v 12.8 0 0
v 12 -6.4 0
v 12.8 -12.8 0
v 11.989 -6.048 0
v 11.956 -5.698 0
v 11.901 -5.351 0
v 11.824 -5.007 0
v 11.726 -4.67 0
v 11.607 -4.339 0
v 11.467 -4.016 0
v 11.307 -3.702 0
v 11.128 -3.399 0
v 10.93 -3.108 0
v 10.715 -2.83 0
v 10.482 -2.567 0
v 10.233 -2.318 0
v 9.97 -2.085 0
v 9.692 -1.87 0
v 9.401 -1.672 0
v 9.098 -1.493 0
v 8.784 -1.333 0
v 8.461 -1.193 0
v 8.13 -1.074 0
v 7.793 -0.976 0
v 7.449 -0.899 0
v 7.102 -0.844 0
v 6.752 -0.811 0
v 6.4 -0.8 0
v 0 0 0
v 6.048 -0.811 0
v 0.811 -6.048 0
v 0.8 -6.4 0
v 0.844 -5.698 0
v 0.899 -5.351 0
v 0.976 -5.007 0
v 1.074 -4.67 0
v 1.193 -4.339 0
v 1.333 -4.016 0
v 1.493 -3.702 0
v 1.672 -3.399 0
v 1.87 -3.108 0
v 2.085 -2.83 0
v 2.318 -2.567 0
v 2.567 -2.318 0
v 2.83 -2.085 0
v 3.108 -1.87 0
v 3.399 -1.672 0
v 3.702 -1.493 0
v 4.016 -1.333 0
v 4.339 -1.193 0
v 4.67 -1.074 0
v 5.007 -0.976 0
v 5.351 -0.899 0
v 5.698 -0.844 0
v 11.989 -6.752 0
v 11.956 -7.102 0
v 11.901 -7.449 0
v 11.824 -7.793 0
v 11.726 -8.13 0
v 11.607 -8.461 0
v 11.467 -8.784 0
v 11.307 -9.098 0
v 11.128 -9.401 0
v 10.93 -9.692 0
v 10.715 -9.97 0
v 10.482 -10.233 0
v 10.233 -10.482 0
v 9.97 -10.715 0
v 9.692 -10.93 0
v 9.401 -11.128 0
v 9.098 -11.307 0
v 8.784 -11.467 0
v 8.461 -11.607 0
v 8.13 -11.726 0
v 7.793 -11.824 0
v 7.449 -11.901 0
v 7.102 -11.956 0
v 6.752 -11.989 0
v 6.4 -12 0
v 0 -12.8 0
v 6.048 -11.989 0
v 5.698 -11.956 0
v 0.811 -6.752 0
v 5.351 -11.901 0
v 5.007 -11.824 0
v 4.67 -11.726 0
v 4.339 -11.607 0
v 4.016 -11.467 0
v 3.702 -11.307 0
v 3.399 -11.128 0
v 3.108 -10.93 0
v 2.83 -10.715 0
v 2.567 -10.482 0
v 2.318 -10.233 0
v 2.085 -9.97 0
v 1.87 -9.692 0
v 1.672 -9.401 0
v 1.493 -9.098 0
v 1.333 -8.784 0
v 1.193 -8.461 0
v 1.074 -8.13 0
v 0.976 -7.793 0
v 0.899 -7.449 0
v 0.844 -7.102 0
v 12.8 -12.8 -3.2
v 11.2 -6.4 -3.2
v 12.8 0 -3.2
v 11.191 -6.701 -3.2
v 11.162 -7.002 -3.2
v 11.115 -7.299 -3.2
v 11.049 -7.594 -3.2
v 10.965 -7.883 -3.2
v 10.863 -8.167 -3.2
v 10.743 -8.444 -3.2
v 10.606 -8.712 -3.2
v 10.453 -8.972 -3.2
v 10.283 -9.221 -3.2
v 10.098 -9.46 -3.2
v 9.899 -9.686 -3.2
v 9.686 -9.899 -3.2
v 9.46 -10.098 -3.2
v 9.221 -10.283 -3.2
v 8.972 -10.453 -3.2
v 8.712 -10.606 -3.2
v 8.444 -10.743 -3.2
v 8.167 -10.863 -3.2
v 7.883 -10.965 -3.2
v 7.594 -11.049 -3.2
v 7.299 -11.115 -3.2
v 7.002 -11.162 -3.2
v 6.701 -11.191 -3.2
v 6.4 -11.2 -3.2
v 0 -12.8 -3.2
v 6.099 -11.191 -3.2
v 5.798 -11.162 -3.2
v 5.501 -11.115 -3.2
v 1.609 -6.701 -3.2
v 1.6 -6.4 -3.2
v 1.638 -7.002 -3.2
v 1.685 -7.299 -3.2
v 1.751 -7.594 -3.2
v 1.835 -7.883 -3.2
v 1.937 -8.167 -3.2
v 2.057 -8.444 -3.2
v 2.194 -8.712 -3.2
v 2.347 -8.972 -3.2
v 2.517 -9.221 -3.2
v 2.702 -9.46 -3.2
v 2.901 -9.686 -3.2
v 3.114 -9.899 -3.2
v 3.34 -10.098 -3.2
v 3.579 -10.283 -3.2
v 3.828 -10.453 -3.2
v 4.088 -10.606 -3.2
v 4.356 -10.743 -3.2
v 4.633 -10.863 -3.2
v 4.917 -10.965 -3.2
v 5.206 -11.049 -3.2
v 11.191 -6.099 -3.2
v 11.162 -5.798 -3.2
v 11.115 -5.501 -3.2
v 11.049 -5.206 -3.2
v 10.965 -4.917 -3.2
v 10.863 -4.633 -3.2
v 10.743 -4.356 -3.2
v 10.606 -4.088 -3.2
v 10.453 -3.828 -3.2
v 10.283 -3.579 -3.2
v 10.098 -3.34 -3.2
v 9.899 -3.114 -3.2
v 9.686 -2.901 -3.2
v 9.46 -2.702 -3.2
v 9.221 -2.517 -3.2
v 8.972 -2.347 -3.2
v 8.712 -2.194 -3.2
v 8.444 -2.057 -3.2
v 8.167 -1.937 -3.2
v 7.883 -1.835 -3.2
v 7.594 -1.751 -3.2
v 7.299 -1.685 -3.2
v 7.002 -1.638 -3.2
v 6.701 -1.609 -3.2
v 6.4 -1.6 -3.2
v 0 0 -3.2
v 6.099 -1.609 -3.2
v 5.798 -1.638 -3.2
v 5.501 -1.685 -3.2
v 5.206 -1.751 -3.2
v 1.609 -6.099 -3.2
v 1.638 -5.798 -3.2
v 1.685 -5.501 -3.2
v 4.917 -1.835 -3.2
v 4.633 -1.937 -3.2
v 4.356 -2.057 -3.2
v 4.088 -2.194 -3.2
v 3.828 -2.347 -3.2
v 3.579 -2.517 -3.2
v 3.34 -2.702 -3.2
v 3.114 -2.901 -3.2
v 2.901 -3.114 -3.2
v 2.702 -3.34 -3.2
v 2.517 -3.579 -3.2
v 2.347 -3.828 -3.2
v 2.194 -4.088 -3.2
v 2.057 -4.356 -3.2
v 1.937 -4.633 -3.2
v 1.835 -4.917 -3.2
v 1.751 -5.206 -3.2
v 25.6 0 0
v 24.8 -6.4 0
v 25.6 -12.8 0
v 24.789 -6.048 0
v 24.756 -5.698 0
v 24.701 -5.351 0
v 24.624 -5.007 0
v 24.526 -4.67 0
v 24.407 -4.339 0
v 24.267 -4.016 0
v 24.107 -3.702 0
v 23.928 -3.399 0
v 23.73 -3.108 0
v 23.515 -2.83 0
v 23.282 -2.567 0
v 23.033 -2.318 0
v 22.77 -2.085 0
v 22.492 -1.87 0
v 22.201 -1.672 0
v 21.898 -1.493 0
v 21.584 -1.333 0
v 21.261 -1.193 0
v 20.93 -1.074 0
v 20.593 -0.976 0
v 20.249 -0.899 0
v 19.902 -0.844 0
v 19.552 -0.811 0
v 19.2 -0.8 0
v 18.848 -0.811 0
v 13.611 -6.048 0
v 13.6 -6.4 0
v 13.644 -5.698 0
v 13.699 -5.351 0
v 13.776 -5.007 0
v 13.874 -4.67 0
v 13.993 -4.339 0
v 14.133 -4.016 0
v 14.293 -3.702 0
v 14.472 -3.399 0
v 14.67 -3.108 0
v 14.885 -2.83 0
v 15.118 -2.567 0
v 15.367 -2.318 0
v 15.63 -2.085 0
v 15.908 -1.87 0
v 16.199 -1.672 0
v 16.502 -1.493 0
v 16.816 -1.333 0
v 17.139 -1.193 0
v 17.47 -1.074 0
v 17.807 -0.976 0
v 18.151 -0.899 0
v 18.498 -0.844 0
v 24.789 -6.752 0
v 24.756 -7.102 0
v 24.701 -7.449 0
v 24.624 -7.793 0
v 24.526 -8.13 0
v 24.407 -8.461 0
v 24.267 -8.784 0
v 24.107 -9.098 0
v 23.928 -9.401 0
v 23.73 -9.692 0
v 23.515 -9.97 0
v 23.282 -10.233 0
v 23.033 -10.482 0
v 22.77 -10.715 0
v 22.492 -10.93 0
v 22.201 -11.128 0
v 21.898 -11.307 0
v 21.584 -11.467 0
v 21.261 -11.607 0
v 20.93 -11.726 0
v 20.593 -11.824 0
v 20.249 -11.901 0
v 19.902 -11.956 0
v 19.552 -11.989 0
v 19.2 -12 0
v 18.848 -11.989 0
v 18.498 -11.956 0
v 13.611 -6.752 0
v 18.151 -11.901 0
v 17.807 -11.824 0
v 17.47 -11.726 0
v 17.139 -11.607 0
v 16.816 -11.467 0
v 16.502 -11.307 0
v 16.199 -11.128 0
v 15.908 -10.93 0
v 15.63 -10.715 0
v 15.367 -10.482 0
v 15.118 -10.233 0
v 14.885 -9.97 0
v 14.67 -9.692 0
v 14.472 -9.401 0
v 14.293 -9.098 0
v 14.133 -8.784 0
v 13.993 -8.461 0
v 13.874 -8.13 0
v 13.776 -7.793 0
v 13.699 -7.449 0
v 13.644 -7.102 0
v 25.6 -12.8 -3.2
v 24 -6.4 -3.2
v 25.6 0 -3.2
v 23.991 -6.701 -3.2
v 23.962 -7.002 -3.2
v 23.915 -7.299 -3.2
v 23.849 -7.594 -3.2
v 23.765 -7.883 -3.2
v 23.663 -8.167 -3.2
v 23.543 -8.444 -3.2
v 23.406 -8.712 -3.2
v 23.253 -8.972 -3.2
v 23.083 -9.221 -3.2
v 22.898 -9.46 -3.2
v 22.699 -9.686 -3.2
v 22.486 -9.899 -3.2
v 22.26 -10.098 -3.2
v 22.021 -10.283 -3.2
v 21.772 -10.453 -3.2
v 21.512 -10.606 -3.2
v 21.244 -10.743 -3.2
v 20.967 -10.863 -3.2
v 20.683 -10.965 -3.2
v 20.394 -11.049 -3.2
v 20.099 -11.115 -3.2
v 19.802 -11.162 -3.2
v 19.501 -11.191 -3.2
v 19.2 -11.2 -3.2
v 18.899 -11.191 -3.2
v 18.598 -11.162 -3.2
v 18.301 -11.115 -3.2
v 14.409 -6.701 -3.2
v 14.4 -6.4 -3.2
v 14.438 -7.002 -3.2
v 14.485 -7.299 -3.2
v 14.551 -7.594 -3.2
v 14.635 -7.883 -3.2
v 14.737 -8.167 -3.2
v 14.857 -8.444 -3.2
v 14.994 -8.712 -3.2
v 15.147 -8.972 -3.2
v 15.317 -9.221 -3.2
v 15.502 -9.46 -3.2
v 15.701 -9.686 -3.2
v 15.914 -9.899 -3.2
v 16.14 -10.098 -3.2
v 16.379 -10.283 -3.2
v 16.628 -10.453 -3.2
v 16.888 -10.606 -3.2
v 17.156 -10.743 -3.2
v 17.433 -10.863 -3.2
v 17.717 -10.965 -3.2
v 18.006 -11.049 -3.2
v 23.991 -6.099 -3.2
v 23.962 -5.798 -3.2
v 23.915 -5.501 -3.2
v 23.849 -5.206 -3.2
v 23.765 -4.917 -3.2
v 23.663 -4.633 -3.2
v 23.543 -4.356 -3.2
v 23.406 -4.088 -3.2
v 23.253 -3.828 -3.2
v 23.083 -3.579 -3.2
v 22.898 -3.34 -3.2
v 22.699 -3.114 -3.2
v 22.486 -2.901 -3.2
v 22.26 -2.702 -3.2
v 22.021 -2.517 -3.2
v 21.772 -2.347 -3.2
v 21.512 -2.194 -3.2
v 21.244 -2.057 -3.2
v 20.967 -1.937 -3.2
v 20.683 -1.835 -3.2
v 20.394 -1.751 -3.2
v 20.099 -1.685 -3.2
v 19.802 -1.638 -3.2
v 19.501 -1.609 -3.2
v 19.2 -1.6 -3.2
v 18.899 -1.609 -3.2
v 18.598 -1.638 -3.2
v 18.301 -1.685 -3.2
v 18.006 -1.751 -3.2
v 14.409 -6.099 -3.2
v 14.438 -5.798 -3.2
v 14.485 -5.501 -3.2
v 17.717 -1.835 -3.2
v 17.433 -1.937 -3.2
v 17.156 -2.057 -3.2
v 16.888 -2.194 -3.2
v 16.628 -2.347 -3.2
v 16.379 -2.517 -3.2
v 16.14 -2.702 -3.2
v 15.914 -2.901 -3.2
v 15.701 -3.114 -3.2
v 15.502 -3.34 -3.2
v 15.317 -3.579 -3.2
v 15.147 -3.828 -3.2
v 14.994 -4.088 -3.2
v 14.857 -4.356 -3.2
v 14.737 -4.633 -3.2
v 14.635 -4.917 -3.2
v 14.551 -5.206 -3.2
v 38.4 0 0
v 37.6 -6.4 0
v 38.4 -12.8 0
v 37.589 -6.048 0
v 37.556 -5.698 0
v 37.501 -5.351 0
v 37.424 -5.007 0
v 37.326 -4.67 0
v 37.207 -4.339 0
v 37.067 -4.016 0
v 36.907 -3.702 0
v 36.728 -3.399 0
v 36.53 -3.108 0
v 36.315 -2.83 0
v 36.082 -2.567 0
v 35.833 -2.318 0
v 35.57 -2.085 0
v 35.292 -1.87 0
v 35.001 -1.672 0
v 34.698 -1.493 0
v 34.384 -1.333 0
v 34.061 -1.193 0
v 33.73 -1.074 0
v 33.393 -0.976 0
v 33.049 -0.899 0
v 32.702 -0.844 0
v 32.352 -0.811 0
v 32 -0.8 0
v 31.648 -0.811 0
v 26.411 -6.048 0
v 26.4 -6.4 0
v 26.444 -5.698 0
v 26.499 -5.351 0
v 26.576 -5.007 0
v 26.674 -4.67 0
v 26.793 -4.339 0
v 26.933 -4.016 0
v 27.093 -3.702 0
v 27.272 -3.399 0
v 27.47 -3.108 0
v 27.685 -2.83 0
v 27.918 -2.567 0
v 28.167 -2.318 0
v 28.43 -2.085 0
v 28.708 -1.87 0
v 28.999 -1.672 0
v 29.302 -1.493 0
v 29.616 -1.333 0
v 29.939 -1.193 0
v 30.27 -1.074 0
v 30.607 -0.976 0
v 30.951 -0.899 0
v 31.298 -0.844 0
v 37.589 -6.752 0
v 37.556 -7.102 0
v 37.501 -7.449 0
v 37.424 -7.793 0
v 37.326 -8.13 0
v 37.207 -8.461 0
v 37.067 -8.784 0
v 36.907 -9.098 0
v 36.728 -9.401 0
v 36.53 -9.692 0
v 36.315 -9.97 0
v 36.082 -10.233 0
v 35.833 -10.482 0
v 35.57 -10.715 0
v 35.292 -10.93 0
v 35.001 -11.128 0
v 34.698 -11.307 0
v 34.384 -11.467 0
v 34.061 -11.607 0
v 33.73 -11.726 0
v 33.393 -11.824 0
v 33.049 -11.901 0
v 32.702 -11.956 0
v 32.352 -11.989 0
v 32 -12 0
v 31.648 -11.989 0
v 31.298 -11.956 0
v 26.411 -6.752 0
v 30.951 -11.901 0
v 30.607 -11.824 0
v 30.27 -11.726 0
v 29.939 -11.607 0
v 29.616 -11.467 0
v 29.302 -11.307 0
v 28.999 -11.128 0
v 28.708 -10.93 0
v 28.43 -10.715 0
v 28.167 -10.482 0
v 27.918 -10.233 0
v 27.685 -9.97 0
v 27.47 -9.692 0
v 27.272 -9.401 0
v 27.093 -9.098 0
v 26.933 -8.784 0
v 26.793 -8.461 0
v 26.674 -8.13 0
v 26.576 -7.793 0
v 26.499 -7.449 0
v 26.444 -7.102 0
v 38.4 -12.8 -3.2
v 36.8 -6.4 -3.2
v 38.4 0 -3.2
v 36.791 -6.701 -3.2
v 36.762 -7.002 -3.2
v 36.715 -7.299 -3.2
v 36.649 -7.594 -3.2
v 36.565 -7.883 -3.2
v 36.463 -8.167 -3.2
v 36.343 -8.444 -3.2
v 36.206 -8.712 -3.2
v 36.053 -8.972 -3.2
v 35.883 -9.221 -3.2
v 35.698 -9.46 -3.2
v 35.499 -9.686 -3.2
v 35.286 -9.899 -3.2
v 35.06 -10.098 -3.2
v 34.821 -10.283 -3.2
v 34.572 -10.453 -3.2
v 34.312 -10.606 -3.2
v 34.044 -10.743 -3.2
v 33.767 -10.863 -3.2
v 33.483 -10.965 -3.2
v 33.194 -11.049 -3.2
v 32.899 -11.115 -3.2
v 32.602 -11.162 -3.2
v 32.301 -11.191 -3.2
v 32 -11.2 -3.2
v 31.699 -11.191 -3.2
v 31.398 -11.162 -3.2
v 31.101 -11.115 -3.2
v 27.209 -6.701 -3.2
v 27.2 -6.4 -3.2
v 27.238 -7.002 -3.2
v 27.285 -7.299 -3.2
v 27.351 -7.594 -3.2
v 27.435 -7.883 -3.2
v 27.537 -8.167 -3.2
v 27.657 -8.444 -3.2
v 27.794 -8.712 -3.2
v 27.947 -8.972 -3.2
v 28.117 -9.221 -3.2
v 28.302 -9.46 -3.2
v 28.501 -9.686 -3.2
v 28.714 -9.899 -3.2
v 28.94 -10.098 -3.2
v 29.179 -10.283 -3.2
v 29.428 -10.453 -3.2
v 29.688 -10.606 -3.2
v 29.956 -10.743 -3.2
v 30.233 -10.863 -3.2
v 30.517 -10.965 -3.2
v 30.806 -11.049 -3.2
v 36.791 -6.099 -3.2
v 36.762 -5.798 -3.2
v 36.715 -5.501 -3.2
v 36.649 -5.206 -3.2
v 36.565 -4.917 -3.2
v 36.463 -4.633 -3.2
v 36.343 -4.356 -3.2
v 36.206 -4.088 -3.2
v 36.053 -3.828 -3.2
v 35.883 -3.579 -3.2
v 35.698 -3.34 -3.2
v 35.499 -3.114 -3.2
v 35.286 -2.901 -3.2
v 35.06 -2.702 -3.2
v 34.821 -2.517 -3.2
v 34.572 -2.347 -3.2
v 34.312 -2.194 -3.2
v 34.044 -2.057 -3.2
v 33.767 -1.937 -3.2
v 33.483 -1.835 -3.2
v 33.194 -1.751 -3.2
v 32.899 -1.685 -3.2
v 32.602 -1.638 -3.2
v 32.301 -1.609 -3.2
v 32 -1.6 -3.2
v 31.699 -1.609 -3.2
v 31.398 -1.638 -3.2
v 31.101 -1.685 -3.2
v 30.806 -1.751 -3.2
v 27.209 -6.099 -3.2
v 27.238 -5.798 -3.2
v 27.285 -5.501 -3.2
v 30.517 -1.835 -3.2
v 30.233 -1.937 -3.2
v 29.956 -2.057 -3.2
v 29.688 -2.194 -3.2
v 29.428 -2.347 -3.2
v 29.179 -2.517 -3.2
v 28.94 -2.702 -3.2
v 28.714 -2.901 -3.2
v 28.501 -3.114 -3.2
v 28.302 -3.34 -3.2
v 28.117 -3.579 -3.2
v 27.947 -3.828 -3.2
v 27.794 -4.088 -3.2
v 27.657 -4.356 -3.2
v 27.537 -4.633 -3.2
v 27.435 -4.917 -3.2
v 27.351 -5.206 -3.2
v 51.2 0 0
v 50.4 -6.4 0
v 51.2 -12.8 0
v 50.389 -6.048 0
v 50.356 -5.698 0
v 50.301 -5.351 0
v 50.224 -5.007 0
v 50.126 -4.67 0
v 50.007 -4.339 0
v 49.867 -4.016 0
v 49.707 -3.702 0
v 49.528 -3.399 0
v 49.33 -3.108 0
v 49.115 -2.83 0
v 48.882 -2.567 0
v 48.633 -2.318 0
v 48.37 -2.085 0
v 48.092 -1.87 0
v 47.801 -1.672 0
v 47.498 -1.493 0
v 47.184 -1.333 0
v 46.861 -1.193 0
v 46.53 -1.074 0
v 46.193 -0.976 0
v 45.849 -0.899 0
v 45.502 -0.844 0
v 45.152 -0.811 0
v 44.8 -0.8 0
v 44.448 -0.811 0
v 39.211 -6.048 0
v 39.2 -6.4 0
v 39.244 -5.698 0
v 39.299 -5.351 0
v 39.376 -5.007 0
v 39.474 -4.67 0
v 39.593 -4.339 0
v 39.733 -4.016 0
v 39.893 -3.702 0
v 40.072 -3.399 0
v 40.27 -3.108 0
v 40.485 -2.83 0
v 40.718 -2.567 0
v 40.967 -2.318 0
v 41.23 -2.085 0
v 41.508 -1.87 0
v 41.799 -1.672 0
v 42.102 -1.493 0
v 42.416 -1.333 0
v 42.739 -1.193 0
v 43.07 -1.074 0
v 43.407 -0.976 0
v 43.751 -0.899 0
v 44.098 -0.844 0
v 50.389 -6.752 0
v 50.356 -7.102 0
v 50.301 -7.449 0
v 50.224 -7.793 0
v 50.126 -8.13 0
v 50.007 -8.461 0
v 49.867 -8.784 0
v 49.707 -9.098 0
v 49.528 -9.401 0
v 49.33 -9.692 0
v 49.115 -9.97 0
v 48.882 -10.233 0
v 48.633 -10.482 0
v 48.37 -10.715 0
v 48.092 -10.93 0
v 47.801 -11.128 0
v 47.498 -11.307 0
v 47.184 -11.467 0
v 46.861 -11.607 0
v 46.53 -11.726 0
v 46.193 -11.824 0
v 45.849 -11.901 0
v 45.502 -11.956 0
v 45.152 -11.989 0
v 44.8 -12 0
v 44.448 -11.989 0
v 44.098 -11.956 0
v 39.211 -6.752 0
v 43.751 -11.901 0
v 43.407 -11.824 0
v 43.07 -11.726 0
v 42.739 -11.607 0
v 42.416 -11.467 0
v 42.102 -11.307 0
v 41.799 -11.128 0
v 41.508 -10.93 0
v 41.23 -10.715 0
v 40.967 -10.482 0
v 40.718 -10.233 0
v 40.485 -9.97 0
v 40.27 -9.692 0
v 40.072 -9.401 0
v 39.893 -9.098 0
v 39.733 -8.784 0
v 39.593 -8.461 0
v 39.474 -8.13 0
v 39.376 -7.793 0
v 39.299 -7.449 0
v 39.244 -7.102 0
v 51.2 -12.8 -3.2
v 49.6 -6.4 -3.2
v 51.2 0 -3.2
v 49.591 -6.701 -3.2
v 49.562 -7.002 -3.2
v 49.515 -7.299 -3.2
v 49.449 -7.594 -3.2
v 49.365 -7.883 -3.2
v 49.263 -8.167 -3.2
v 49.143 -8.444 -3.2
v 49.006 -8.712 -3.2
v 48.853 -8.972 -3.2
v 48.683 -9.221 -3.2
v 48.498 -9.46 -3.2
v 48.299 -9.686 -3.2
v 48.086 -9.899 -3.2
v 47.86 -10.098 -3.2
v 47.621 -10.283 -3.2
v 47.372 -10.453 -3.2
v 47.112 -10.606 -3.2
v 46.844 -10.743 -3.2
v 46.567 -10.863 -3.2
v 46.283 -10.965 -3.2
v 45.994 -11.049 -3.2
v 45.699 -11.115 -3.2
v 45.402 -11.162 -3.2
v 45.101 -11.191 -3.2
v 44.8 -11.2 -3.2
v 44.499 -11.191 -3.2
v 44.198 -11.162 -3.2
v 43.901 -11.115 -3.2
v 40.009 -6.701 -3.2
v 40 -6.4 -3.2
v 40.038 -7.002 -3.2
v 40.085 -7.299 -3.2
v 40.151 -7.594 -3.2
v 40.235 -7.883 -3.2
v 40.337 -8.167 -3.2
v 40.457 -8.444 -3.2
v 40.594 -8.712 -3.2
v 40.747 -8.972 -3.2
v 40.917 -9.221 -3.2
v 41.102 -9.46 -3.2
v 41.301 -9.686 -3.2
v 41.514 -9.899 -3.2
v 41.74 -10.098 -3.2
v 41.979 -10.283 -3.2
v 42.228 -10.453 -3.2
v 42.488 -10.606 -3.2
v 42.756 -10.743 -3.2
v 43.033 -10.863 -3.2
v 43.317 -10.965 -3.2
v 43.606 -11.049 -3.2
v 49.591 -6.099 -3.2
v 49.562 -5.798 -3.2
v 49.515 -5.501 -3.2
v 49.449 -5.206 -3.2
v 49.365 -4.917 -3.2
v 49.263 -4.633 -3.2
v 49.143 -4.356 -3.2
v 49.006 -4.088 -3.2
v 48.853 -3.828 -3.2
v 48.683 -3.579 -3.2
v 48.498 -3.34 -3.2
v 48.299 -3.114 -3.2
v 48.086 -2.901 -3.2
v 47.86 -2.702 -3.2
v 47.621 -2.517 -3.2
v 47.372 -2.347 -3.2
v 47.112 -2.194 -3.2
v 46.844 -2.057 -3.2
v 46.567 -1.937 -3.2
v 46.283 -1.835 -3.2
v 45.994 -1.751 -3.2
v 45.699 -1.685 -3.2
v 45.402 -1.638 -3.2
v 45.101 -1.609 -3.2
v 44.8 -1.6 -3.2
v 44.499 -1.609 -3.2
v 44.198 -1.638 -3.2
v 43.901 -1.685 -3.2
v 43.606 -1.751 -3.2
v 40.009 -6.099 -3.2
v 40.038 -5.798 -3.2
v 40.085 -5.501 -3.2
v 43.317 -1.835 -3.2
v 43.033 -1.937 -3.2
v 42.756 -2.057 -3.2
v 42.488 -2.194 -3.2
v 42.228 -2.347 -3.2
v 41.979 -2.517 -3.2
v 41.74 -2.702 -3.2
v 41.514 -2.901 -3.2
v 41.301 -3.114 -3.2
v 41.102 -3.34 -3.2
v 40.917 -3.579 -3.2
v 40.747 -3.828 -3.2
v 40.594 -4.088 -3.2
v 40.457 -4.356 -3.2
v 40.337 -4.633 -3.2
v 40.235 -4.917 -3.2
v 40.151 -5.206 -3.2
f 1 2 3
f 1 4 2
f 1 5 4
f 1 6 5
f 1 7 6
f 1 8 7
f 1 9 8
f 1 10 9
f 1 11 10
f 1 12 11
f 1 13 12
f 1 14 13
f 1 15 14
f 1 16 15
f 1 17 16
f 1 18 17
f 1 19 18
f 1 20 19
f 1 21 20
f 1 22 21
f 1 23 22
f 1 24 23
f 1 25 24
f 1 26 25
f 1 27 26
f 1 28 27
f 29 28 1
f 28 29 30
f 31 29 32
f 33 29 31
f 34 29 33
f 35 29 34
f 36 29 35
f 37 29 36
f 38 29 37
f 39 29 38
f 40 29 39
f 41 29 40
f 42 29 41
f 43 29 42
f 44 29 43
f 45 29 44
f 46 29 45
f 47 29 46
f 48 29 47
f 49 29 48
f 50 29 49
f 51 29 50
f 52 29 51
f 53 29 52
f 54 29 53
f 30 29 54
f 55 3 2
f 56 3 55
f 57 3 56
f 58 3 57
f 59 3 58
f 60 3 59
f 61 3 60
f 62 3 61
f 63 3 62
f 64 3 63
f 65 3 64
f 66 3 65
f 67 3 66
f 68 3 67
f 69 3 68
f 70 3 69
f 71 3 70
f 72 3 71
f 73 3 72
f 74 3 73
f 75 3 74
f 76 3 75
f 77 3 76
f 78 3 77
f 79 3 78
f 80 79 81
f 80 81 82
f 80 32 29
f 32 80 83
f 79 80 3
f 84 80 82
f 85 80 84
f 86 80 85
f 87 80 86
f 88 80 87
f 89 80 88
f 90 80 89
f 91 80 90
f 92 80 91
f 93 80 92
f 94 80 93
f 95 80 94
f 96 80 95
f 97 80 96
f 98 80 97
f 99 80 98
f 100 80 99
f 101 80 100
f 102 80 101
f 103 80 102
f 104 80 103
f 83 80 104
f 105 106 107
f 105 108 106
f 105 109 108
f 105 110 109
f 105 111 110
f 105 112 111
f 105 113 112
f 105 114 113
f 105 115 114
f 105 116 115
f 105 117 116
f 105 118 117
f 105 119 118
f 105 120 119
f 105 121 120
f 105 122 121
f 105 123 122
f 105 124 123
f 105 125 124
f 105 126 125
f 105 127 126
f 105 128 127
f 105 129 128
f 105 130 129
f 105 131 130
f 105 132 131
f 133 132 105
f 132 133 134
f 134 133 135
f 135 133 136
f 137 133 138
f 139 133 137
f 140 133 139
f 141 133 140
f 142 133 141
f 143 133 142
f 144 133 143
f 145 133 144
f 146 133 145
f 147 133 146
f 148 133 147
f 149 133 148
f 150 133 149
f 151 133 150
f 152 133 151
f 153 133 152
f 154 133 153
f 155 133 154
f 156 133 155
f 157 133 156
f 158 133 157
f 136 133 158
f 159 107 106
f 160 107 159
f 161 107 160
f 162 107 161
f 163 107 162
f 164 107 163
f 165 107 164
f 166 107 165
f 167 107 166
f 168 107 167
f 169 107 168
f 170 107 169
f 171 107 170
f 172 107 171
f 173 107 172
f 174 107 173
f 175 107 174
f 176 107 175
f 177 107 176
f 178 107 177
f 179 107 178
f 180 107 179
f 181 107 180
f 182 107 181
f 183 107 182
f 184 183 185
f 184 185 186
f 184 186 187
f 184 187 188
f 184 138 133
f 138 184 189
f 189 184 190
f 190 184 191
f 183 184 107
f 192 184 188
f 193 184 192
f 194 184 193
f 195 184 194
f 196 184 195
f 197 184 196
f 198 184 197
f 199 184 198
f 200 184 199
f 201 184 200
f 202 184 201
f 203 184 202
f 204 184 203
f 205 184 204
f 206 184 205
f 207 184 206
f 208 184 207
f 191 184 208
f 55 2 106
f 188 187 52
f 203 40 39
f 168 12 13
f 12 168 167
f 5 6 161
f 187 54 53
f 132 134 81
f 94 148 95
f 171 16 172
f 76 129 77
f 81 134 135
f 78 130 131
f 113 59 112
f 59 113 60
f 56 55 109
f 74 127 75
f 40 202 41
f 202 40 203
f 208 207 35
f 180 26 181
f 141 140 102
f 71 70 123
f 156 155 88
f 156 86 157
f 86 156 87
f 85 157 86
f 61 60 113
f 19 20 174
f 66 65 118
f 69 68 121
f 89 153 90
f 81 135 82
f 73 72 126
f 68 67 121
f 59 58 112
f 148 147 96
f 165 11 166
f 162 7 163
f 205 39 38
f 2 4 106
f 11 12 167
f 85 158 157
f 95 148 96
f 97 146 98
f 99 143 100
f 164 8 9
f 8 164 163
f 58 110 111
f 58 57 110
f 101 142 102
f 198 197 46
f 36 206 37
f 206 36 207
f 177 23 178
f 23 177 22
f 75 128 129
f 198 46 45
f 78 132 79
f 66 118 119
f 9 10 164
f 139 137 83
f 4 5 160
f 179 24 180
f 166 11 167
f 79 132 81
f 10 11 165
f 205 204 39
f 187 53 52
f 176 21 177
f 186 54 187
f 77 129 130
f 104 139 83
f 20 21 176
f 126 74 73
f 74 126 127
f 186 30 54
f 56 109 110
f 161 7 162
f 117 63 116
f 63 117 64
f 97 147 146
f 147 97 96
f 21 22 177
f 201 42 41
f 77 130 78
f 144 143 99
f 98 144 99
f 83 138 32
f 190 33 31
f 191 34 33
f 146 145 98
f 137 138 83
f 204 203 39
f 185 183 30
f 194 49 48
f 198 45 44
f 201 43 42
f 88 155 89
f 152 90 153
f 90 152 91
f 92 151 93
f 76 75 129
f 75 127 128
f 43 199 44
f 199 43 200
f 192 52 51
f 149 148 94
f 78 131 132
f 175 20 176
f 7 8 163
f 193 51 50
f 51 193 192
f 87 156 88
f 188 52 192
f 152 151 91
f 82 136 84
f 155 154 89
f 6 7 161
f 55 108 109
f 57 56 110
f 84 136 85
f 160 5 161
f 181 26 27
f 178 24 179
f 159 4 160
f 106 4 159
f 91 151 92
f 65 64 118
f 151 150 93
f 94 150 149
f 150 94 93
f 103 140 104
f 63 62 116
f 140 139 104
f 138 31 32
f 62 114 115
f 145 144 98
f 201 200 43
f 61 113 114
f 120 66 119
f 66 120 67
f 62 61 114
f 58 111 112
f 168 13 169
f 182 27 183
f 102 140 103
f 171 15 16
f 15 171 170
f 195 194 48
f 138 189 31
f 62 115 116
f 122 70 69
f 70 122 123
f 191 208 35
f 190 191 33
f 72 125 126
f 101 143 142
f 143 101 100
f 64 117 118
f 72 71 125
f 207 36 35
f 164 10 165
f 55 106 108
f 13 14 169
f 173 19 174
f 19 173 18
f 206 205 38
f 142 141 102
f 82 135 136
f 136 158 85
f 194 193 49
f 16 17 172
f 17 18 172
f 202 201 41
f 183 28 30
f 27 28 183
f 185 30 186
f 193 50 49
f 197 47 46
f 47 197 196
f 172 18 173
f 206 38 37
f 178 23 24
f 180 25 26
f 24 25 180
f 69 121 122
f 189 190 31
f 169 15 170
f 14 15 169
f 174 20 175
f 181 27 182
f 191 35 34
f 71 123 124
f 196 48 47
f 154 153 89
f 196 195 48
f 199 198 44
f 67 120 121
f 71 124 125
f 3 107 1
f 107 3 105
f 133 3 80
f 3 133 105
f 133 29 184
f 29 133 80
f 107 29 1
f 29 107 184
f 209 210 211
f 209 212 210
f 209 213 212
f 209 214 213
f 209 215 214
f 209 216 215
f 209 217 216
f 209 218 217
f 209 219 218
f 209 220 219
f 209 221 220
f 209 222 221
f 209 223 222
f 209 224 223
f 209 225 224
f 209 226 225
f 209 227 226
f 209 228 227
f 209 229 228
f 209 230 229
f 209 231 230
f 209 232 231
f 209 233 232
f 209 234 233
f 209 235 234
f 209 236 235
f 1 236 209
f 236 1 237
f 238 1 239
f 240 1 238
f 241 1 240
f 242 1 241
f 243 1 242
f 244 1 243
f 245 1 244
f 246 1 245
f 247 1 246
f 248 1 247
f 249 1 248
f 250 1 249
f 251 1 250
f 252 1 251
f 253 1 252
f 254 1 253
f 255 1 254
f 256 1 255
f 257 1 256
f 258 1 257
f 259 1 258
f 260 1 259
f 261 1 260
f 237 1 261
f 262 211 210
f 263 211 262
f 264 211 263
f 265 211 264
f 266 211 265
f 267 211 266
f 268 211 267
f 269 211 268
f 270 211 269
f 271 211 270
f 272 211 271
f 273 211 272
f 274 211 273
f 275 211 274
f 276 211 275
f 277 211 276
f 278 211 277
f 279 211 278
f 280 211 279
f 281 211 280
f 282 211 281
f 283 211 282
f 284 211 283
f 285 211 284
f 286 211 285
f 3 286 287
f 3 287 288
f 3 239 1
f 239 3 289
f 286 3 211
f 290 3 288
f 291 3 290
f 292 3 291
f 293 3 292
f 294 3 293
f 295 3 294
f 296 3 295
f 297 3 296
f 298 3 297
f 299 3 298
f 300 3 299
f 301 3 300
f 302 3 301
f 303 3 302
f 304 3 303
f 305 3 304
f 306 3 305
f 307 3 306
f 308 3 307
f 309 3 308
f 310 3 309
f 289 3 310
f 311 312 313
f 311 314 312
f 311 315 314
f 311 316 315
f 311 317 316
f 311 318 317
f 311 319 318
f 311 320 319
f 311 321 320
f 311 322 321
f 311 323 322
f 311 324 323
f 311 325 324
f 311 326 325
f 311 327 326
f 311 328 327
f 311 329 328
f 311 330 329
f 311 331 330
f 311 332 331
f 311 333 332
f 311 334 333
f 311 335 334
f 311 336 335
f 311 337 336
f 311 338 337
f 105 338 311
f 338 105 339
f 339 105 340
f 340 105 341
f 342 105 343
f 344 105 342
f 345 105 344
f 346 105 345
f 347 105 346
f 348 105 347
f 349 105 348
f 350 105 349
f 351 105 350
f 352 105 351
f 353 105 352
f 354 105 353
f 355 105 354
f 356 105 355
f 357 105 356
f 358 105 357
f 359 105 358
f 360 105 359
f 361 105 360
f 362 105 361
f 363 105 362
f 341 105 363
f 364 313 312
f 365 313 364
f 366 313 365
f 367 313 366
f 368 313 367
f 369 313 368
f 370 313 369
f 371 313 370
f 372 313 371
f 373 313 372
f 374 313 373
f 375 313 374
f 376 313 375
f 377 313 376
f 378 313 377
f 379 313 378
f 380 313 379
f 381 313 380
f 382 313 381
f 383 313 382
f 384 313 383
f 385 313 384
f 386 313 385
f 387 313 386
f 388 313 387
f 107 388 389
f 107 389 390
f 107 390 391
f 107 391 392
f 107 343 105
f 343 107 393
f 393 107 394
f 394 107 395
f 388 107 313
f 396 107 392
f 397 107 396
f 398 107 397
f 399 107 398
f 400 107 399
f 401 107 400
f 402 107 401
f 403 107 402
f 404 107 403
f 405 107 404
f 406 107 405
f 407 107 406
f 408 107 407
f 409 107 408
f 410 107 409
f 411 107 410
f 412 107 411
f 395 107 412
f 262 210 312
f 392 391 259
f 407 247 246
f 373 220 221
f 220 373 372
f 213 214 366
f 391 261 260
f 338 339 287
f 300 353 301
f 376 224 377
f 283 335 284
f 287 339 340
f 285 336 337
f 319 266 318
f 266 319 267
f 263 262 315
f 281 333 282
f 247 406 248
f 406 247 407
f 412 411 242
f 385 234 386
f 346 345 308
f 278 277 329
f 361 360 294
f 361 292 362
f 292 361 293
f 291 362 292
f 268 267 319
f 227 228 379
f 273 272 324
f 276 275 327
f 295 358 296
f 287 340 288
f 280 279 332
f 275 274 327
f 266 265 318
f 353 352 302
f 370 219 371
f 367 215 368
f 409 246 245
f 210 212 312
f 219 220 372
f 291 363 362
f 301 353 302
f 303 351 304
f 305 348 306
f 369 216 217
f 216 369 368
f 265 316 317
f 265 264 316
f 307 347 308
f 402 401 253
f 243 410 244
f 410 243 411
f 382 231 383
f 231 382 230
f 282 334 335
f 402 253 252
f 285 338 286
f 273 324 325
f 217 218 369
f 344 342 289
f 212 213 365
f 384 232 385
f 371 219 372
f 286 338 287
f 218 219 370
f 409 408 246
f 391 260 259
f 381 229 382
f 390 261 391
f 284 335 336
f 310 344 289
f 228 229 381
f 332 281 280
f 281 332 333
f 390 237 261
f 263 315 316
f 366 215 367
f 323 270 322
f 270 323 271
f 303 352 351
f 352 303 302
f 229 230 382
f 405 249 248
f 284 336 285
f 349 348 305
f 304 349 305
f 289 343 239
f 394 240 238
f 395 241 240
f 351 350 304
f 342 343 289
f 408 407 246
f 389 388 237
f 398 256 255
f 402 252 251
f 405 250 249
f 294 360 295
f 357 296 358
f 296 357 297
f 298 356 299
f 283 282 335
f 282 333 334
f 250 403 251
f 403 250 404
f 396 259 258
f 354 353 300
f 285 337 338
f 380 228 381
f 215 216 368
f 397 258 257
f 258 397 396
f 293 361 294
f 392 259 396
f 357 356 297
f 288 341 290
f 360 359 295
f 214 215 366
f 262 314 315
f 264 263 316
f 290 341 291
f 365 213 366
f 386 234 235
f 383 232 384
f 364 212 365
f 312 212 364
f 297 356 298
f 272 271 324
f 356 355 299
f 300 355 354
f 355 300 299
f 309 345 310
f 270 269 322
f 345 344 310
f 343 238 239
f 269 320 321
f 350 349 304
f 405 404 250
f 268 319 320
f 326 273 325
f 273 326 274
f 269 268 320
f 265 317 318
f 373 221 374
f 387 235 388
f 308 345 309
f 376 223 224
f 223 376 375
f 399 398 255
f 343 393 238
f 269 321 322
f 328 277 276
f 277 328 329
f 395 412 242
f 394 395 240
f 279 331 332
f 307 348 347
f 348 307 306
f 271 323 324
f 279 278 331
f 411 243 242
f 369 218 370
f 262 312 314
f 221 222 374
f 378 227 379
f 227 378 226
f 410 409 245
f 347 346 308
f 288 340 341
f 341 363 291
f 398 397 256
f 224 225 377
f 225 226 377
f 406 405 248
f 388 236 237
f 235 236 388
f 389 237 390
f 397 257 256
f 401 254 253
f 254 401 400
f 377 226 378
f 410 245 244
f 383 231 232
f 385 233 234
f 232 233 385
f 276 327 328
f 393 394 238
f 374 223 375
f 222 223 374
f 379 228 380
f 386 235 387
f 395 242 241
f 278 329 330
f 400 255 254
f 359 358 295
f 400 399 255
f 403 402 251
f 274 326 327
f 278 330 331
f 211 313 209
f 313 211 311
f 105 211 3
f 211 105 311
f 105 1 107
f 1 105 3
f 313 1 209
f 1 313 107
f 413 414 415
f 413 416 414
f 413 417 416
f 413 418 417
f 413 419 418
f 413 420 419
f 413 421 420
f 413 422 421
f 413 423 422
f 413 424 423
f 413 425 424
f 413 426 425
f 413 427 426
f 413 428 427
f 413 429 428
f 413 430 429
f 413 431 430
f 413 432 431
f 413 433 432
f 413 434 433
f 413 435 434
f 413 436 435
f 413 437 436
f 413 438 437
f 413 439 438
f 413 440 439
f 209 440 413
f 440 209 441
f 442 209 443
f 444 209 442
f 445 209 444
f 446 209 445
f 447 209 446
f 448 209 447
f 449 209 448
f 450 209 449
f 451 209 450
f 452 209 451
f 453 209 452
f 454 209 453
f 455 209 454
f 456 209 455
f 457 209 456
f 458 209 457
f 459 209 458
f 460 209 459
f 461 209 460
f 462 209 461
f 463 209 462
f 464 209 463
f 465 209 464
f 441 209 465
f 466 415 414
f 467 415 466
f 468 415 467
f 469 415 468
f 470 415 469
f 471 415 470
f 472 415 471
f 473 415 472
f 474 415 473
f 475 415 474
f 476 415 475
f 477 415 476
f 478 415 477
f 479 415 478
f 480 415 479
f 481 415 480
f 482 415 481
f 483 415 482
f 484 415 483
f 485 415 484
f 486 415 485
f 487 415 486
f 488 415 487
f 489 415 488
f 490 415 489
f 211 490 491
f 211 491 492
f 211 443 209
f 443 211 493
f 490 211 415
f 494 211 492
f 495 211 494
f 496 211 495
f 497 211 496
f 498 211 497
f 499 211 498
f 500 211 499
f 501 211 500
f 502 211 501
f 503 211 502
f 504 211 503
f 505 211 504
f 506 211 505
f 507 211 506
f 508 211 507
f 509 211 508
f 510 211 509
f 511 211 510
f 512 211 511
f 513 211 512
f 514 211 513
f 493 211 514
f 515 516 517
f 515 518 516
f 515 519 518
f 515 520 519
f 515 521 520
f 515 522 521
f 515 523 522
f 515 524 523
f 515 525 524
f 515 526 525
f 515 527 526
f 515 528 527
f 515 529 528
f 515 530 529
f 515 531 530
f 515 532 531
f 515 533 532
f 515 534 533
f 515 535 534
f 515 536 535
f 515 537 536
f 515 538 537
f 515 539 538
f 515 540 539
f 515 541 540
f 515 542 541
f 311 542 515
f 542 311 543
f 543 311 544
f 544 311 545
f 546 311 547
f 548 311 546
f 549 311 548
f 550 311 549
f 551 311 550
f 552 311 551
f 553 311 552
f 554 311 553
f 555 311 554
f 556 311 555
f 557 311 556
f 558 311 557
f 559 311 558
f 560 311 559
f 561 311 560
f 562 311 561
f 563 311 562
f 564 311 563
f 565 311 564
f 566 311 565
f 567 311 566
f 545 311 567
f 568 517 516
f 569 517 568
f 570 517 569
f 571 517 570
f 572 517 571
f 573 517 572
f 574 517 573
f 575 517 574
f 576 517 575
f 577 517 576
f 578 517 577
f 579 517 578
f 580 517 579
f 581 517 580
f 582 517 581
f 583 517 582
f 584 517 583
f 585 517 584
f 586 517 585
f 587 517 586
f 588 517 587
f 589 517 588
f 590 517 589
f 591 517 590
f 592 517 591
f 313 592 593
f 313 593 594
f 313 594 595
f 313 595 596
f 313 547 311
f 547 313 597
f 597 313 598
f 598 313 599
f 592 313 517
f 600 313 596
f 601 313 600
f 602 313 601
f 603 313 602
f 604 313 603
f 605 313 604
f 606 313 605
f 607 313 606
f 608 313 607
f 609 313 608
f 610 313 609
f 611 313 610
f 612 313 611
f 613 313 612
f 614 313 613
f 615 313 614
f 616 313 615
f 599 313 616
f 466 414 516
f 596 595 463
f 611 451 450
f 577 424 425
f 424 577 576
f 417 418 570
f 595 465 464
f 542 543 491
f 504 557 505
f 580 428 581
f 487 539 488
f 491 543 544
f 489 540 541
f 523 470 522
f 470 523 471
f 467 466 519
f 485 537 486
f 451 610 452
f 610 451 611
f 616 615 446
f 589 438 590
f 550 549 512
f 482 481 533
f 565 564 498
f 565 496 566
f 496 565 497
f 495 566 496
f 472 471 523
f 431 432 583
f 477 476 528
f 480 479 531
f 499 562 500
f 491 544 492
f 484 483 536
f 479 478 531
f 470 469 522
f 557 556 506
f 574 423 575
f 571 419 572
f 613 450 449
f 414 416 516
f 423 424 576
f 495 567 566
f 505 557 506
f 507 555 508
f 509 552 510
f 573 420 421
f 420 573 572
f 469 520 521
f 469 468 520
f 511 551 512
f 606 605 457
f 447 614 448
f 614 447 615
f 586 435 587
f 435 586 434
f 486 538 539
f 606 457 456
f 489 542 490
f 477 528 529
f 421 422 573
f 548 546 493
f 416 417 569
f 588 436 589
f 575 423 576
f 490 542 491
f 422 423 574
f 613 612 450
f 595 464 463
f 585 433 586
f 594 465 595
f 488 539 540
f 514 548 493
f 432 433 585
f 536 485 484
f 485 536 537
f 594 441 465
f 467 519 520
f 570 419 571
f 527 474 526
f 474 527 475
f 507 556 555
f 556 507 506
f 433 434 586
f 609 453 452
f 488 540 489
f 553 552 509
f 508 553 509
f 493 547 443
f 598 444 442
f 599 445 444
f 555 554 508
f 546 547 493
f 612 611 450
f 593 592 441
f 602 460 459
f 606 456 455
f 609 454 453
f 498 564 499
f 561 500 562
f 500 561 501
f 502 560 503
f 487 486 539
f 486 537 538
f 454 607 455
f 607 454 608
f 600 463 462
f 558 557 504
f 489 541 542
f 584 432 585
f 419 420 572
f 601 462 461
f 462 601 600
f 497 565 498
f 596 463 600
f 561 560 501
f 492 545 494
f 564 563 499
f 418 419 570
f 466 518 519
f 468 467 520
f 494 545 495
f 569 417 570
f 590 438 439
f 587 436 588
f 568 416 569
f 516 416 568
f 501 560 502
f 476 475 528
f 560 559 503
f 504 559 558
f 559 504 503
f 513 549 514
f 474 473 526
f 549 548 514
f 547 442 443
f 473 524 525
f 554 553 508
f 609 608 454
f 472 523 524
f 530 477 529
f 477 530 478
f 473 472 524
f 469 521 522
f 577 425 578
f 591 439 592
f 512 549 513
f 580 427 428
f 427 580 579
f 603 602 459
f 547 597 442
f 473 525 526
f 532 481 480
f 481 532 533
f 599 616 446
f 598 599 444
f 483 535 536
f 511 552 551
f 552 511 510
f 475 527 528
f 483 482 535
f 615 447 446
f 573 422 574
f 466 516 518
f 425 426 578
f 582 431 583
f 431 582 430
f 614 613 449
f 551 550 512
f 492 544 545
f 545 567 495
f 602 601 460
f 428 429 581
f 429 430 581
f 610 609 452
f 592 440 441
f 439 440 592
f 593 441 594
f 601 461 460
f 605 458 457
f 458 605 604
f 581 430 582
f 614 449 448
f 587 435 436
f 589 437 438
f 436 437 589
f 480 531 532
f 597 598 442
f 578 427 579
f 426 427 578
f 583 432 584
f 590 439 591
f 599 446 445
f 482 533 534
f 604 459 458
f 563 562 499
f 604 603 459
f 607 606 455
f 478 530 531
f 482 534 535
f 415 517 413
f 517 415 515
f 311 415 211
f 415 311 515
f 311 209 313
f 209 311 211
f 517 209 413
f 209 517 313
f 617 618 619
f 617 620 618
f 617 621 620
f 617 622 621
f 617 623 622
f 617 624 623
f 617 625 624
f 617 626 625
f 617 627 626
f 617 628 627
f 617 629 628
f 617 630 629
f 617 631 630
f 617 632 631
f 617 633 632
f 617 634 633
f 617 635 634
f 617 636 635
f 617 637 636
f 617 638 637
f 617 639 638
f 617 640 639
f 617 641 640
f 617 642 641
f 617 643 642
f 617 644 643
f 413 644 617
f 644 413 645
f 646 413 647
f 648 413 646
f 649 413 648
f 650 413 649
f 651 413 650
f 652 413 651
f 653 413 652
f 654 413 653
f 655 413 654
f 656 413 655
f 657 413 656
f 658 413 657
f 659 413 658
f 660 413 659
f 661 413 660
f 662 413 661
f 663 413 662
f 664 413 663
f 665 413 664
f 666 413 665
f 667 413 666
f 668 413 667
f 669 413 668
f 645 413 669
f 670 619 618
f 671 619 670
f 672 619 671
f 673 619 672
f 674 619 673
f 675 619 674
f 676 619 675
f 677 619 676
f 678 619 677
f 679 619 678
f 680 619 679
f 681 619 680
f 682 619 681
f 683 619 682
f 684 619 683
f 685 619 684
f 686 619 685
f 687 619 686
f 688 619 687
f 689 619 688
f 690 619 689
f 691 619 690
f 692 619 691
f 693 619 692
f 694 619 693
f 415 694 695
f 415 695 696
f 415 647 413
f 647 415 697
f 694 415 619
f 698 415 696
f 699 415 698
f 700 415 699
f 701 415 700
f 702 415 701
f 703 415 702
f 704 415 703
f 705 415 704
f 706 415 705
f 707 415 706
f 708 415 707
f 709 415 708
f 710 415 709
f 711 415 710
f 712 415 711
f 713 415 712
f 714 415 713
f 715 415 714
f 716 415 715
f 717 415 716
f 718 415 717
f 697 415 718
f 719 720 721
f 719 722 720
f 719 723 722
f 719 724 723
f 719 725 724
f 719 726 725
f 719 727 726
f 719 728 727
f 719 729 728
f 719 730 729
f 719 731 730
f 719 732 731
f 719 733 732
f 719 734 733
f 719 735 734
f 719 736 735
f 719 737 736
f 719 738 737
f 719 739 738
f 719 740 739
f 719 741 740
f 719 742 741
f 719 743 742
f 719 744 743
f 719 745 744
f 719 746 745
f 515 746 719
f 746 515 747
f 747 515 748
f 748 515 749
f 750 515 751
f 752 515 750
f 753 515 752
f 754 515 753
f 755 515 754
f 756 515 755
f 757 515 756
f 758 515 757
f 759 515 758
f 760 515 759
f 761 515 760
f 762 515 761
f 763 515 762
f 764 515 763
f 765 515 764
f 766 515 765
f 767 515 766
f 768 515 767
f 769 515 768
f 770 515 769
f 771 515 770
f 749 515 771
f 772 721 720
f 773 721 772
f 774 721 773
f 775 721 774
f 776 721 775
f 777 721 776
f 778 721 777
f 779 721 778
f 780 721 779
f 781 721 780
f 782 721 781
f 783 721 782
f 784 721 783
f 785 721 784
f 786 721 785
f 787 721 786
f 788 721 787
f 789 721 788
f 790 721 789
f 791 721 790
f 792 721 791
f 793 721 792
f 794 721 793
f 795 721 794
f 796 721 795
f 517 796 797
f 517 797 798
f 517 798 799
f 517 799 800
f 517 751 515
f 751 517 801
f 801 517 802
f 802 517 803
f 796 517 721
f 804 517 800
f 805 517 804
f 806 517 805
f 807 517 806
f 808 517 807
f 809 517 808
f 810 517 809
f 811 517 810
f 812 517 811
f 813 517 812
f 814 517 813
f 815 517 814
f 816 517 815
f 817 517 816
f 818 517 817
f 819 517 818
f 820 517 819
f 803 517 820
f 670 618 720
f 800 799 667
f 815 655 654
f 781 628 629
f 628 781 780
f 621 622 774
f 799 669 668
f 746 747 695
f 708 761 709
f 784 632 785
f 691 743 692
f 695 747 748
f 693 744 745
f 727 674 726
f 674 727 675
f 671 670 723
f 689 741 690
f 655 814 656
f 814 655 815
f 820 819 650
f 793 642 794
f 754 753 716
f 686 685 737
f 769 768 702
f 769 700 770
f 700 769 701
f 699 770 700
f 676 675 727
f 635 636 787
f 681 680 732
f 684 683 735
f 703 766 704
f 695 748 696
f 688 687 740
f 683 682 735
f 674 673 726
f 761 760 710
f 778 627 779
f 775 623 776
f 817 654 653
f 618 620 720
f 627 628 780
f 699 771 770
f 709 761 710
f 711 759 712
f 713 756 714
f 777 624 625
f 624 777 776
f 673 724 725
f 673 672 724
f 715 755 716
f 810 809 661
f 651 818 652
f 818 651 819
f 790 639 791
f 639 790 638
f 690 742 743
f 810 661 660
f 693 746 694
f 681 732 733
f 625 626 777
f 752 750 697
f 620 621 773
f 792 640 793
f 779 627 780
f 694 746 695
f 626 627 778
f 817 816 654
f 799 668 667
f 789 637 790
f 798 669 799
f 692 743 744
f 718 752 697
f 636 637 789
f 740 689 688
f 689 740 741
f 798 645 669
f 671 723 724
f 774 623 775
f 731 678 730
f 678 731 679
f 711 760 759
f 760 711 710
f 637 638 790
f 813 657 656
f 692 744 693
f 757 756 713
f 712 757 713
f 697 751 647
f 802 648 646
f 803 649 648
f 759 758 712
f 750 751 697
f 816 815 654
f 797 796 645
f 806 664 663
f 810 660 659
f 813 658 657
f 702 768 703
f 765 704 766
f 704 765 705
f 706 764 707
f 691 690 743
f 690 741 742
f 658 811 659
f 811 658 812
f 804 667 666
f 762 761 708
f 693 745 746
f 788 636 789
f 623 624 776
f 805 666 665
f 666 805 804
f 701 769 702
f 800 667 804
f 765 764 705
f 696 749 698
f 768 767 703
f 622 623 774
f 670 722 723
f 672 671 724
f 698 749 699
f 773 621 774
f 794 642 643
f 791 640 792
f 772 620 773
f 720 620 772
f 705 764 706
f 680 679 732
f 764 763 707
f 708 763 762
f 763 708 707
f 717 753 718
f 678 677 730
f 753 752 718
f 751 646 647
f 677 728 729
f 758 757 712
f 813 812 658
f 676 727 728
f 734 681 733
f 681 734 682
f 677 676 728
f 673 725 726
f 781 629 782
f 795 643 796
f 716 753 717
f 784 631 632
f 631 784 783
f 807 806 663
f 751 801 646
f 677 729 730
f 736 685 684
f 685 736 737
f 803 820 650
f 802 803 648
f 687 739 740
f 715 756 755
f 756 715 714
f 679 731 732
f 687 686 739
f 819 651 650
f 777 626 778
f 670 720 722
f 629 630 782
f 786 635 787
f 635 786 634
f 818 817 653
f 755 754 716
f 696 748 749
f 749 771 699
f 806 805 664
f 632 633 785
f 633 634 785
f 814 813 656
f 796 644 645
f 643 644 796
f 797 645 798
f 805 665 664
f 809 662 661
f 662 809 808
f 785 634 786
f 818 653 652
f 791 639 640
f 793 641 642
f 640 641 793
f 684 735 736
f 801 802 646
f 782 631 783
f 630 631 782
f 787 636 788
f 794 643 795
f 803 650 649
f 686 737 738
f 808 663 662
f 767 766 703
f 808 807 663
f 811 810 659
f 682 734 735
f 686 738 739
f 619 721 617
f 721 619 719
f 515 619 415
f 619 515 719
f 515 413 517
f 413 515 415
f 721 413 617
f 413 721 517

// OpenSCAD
size =12.8;
model = "CH";

size1=4;
size2=1;
size3=1 ;

rounded = false;

finalRotate=[0,0,0];
finalMirror=[0,0,0];



rotate([finalRotate[0], finalRotate[1], finalRotate[2]]) {
mirror([finalMirror[0], finalMirror[1], finalMirror[2]]) {    
    // Model C (Cube)    
    if (model =="C") {
        for (z = [0:size3-1]) {
           for (x = [0:size2-1]) {
               for (y = [0:size1-1]) {           
                   translate([y*size,x*size,z*size/2]) hole();                          
               }
           }        
        }        
    }
    // Model C (Cube) Half   
    if (model =="CH") {
        for (z = [0:size3-1]) {
           for (x = [0:size2-1]) {
               for (y = [0:size1-1]) {
                    rotate([180,0,0])
                   translate([y*size,x*size,z*size/2]) halfHole();                          
               }
           }        
        }        
    }
    
                       
}
}


module hole(corners=[true,true,true,true]) {
    halfHole(corners);
     translate([0,0,size/2]) mirror([0,0,1])  halfHole(corners);
}

module halfHole(corners=[true,true,true,true]) {
    $fn=100;

    
    // return to origin
    translate([size/2, size/2, 0]) {
        difference() {
            cylinder(h=size/4,r1=size/2, r2=size/2, center=false);
            cylinder(h=size/4,r1=size/2 - size/16, r2=size/2- size/8, center=false);
            //translate([size/2, size/2, 0]) cylinder (h = size/4, r1=8/2, r2=6.4/2, center=false, $fn=100 );
           //translate([size/2, size/2, size/4])  cylinder (h = 4.8, r1=6.4/2, r2=8/2, center=false, $fn=100 );
        }
        if (corners[0]) {
            rotate([0,0,0]) corner();
        }
        if (corners[1]) {
            rotate([0,0,90]) corner();
        }
        if (corners[2]) {
            rotate([0,0,180]) corner();
        }
        if (corners[3]) {
            rotate([0,0,270]) corner();
        }            
    }
}

module corner() {
    $fn=100;
    difference() {
        cube([size/2, size/2, size/4], center=false);
        cylinder(h=size/4,r1=size/2, r2=size/2, center=false);
    }
}
